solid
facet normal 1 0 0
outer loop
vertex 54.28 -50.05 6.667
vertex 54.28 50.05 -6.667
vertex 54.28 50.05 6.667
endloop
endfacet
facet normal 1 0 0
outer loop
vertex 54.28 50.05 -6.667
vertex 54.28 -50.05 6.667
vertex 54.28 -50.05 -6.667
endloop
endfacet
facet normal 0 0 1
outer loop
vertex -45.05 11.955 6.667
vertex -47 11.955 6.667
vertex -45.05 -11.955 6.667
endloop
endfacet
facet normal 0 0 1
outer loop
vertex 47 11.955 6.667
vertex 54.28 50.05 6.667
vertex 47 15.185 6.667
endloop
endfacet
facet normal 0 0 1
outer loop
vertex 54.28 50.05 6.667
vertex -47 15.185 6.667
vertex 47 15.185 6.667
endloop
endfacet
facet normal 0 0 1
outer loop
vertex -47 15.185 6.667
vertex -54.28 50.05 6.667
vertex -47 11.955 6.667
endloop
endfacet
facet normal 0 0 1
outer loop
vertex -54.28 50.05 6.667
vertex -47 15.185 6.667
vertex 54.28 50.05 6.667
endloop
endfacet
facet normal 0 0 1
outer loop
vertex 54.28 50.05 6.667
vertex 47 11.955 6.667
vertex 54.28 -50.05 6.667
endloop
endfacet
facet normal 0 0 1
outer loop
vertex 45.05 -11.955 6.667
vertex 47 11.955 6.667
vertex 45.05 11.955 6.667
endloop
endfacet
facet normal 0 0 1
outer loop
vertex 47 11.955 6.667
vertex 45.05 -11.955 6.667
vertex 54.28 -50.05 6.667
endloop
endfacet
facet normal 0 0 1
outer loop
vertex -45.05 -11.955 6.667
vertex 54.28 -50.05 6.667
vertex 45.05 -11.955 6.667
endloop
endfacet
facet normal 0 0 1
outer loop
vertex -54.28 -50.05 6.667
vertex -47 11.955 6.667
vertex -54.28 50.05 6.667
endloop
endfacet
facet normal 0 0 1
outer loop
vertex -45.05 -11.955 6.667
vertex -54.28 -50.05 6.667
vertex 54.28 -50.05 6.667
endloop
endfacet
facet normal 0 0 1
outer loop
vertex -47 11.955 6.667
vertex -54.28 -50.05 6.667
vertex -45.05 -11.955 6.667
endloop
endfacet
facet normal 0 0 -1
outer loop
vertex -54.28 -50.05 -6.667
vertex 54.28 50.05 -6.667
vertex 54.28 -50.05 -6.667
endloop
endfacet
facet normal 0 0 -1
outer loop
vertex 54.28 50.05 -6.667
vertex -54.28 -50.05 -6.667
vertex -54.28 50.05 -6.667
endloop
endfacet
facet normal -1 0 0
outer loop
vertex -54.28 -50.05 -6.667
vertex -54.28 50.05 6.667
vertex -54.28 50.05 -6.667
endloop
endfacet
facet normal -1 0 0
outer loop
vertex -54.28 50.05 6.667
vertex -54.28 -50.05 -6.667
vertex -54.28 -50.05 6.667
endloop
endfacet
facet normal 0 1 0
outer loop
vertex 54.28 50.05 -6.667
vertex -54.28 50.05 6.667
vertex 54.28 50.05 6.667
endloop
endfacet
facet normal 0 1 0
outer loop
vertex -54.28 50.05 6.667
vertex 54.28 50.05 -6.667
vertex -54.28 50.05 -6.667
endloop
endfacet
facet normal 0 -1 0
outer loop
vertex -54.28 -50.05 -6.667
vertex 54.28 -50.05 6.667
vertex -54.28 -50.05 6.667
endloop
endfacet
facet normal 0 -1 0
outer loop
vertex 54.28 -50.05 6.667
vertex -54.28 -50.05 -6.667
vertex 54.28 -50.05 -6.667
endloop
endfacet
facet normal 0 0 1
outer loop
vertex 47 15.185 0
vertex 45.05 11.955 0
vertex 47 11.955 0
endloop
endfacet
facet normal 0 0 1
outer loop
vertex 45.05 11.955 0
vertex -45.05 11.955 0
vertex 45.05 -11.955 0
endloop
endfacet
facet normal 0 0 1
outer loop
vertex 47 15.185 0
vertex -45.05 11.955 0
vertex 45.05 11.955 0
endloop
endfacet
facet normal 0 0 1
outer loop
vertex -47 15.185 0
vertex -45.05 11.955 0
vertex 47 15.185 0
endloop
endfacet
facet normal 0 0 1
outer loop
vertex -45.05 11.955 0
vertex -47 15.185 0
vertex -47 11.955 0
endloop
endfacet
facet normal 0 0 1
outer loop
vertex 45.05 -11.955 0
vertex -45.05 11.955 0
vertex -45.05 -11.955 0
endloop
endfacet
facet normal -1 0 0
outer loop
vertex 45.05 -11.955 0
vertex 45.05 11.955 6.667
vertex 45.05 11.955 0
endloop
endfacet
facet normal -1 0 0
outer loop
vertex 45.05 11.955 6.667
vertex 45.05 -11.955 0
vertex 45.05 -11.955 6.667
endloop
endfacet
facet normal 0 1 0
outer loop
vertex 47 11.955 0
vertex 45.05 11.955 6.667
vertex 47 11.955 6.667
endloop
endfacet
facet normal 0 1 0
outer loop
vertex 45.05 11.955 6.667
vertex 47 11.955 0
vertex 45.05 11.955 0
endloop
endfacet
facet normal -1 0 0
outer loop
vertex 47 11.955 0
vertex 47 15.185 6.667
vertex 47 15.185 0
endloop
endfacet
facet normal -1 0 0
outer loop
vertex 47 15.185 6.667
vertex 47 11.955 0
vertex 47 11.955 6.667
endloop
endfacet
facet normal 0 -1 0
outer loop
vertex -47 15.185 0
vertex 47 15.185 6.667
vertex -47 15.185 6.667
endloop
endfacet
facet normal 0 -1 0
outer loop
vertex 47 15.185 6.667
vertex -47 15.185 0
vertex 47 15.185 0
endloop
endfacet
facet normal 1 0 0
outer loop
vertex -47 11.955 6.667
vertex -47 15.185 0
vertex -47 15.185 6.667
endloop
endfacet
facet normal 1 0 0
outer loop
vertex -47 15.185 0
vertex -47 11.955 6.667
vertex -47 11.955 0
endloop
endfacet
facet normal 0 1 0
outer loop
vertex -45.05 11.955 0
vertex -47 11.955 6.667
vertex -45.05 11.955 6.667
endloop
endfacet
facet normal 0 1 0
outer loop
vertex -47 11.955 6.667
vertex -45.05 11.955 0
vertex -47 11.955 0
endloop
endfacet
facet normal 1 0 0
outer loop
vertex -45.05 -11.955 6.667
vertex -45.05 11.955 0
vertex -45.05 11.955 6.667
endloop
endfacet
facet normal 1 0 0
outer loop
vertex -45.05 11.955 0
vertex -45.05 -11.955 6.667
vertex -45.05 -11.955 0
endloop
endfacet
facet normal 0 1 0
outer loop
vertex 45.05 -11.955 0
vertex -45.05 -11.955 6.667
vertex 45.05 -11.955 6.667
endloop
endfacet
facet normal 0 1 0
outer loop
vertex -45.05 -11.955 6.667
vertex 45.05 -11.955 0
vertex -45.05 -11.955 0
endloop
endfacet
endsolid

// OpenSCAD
$fn=100;

CENTERED=true;

FRONT2BACK=27.14;
FRONT2PLATE=23.91;
FRONT_WIDE= 90.1;

HEIGHT_HOLDER = 20;

BACKPLATE_THICK= FRONT2BACK - FRONT2PLATE;  // thicknesss of back plate
BACKPLATE_WIDE = 94;

module make_ledbox()
{
    linear_extrude(height = HEIGHT_HOLDER)
    {
        square([FRONT_WIDE, FRONT2PLATE], CENTERED);
        translate([0, FRONT2BACK /2  , 0])
        #square([BACKPLATE_WIDE, BACKPLATE_THICK], CENTERED);
}
}

//make_ledbox();

difference()
{
    cube([FRONT2BACK * 4, FRONT_WIDE + 10, HEIGHT_HOLDER * 2/3], true);
    make_ledbox();
}
